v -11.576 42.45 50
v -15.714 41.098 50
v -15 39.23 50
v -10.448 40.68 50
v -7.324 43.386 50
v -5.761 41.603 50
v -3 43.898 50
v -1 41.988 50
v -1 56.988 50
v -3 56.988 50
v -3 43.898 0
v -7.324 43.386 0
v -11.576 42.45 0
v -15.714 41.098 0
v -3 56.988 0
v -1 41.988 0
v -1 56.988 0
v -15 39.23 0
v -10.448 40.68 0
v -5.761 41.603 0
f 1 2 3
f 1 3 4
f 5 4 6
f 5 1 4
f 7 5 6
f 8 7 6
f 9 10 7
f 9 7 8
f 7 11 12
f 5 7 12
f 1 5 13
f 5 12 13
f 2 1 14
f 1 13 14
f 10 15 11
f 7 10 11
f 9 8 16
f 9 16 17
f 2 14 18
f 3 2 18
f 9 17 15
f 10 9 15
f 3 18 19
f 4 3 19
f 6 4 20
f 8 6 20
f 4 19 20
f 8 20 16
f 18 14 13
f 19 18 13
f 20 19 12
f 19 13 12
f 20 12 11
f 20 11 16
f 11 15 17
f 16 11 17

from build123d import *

# Parameters (mm, degrees)
BOSS_EXTRUDE1_DEPTH = 50


with BuildPart() as part:
    # Sketch1 → Boss-Extrude1 (new body)
    with BuildSketch(Plane.XY):
        with BuildLine():
            Line((-1, 41.98809355), (-1, 56.98809355))
            Line((-1, 56.98809355), (-3, 56.98809355))
            Line((-3, 56.98809355), (-3, 43.897608135))
            ThreePointArc((-3, 43.897608135), (-9.461252976, 42.97074228), (-15.714285714, 41.098190039))
            Line((-15.714285714, 41.098190039), (-15, 39.230090492))
            ThreePointArc((-15, 39.230090492), (-8.117982829, 41.207988968), (-1, 41.98809355))
        make_face()
    extrude(amount=BOSS_EXTRUDE1_DEPTH)


solid = part.part
